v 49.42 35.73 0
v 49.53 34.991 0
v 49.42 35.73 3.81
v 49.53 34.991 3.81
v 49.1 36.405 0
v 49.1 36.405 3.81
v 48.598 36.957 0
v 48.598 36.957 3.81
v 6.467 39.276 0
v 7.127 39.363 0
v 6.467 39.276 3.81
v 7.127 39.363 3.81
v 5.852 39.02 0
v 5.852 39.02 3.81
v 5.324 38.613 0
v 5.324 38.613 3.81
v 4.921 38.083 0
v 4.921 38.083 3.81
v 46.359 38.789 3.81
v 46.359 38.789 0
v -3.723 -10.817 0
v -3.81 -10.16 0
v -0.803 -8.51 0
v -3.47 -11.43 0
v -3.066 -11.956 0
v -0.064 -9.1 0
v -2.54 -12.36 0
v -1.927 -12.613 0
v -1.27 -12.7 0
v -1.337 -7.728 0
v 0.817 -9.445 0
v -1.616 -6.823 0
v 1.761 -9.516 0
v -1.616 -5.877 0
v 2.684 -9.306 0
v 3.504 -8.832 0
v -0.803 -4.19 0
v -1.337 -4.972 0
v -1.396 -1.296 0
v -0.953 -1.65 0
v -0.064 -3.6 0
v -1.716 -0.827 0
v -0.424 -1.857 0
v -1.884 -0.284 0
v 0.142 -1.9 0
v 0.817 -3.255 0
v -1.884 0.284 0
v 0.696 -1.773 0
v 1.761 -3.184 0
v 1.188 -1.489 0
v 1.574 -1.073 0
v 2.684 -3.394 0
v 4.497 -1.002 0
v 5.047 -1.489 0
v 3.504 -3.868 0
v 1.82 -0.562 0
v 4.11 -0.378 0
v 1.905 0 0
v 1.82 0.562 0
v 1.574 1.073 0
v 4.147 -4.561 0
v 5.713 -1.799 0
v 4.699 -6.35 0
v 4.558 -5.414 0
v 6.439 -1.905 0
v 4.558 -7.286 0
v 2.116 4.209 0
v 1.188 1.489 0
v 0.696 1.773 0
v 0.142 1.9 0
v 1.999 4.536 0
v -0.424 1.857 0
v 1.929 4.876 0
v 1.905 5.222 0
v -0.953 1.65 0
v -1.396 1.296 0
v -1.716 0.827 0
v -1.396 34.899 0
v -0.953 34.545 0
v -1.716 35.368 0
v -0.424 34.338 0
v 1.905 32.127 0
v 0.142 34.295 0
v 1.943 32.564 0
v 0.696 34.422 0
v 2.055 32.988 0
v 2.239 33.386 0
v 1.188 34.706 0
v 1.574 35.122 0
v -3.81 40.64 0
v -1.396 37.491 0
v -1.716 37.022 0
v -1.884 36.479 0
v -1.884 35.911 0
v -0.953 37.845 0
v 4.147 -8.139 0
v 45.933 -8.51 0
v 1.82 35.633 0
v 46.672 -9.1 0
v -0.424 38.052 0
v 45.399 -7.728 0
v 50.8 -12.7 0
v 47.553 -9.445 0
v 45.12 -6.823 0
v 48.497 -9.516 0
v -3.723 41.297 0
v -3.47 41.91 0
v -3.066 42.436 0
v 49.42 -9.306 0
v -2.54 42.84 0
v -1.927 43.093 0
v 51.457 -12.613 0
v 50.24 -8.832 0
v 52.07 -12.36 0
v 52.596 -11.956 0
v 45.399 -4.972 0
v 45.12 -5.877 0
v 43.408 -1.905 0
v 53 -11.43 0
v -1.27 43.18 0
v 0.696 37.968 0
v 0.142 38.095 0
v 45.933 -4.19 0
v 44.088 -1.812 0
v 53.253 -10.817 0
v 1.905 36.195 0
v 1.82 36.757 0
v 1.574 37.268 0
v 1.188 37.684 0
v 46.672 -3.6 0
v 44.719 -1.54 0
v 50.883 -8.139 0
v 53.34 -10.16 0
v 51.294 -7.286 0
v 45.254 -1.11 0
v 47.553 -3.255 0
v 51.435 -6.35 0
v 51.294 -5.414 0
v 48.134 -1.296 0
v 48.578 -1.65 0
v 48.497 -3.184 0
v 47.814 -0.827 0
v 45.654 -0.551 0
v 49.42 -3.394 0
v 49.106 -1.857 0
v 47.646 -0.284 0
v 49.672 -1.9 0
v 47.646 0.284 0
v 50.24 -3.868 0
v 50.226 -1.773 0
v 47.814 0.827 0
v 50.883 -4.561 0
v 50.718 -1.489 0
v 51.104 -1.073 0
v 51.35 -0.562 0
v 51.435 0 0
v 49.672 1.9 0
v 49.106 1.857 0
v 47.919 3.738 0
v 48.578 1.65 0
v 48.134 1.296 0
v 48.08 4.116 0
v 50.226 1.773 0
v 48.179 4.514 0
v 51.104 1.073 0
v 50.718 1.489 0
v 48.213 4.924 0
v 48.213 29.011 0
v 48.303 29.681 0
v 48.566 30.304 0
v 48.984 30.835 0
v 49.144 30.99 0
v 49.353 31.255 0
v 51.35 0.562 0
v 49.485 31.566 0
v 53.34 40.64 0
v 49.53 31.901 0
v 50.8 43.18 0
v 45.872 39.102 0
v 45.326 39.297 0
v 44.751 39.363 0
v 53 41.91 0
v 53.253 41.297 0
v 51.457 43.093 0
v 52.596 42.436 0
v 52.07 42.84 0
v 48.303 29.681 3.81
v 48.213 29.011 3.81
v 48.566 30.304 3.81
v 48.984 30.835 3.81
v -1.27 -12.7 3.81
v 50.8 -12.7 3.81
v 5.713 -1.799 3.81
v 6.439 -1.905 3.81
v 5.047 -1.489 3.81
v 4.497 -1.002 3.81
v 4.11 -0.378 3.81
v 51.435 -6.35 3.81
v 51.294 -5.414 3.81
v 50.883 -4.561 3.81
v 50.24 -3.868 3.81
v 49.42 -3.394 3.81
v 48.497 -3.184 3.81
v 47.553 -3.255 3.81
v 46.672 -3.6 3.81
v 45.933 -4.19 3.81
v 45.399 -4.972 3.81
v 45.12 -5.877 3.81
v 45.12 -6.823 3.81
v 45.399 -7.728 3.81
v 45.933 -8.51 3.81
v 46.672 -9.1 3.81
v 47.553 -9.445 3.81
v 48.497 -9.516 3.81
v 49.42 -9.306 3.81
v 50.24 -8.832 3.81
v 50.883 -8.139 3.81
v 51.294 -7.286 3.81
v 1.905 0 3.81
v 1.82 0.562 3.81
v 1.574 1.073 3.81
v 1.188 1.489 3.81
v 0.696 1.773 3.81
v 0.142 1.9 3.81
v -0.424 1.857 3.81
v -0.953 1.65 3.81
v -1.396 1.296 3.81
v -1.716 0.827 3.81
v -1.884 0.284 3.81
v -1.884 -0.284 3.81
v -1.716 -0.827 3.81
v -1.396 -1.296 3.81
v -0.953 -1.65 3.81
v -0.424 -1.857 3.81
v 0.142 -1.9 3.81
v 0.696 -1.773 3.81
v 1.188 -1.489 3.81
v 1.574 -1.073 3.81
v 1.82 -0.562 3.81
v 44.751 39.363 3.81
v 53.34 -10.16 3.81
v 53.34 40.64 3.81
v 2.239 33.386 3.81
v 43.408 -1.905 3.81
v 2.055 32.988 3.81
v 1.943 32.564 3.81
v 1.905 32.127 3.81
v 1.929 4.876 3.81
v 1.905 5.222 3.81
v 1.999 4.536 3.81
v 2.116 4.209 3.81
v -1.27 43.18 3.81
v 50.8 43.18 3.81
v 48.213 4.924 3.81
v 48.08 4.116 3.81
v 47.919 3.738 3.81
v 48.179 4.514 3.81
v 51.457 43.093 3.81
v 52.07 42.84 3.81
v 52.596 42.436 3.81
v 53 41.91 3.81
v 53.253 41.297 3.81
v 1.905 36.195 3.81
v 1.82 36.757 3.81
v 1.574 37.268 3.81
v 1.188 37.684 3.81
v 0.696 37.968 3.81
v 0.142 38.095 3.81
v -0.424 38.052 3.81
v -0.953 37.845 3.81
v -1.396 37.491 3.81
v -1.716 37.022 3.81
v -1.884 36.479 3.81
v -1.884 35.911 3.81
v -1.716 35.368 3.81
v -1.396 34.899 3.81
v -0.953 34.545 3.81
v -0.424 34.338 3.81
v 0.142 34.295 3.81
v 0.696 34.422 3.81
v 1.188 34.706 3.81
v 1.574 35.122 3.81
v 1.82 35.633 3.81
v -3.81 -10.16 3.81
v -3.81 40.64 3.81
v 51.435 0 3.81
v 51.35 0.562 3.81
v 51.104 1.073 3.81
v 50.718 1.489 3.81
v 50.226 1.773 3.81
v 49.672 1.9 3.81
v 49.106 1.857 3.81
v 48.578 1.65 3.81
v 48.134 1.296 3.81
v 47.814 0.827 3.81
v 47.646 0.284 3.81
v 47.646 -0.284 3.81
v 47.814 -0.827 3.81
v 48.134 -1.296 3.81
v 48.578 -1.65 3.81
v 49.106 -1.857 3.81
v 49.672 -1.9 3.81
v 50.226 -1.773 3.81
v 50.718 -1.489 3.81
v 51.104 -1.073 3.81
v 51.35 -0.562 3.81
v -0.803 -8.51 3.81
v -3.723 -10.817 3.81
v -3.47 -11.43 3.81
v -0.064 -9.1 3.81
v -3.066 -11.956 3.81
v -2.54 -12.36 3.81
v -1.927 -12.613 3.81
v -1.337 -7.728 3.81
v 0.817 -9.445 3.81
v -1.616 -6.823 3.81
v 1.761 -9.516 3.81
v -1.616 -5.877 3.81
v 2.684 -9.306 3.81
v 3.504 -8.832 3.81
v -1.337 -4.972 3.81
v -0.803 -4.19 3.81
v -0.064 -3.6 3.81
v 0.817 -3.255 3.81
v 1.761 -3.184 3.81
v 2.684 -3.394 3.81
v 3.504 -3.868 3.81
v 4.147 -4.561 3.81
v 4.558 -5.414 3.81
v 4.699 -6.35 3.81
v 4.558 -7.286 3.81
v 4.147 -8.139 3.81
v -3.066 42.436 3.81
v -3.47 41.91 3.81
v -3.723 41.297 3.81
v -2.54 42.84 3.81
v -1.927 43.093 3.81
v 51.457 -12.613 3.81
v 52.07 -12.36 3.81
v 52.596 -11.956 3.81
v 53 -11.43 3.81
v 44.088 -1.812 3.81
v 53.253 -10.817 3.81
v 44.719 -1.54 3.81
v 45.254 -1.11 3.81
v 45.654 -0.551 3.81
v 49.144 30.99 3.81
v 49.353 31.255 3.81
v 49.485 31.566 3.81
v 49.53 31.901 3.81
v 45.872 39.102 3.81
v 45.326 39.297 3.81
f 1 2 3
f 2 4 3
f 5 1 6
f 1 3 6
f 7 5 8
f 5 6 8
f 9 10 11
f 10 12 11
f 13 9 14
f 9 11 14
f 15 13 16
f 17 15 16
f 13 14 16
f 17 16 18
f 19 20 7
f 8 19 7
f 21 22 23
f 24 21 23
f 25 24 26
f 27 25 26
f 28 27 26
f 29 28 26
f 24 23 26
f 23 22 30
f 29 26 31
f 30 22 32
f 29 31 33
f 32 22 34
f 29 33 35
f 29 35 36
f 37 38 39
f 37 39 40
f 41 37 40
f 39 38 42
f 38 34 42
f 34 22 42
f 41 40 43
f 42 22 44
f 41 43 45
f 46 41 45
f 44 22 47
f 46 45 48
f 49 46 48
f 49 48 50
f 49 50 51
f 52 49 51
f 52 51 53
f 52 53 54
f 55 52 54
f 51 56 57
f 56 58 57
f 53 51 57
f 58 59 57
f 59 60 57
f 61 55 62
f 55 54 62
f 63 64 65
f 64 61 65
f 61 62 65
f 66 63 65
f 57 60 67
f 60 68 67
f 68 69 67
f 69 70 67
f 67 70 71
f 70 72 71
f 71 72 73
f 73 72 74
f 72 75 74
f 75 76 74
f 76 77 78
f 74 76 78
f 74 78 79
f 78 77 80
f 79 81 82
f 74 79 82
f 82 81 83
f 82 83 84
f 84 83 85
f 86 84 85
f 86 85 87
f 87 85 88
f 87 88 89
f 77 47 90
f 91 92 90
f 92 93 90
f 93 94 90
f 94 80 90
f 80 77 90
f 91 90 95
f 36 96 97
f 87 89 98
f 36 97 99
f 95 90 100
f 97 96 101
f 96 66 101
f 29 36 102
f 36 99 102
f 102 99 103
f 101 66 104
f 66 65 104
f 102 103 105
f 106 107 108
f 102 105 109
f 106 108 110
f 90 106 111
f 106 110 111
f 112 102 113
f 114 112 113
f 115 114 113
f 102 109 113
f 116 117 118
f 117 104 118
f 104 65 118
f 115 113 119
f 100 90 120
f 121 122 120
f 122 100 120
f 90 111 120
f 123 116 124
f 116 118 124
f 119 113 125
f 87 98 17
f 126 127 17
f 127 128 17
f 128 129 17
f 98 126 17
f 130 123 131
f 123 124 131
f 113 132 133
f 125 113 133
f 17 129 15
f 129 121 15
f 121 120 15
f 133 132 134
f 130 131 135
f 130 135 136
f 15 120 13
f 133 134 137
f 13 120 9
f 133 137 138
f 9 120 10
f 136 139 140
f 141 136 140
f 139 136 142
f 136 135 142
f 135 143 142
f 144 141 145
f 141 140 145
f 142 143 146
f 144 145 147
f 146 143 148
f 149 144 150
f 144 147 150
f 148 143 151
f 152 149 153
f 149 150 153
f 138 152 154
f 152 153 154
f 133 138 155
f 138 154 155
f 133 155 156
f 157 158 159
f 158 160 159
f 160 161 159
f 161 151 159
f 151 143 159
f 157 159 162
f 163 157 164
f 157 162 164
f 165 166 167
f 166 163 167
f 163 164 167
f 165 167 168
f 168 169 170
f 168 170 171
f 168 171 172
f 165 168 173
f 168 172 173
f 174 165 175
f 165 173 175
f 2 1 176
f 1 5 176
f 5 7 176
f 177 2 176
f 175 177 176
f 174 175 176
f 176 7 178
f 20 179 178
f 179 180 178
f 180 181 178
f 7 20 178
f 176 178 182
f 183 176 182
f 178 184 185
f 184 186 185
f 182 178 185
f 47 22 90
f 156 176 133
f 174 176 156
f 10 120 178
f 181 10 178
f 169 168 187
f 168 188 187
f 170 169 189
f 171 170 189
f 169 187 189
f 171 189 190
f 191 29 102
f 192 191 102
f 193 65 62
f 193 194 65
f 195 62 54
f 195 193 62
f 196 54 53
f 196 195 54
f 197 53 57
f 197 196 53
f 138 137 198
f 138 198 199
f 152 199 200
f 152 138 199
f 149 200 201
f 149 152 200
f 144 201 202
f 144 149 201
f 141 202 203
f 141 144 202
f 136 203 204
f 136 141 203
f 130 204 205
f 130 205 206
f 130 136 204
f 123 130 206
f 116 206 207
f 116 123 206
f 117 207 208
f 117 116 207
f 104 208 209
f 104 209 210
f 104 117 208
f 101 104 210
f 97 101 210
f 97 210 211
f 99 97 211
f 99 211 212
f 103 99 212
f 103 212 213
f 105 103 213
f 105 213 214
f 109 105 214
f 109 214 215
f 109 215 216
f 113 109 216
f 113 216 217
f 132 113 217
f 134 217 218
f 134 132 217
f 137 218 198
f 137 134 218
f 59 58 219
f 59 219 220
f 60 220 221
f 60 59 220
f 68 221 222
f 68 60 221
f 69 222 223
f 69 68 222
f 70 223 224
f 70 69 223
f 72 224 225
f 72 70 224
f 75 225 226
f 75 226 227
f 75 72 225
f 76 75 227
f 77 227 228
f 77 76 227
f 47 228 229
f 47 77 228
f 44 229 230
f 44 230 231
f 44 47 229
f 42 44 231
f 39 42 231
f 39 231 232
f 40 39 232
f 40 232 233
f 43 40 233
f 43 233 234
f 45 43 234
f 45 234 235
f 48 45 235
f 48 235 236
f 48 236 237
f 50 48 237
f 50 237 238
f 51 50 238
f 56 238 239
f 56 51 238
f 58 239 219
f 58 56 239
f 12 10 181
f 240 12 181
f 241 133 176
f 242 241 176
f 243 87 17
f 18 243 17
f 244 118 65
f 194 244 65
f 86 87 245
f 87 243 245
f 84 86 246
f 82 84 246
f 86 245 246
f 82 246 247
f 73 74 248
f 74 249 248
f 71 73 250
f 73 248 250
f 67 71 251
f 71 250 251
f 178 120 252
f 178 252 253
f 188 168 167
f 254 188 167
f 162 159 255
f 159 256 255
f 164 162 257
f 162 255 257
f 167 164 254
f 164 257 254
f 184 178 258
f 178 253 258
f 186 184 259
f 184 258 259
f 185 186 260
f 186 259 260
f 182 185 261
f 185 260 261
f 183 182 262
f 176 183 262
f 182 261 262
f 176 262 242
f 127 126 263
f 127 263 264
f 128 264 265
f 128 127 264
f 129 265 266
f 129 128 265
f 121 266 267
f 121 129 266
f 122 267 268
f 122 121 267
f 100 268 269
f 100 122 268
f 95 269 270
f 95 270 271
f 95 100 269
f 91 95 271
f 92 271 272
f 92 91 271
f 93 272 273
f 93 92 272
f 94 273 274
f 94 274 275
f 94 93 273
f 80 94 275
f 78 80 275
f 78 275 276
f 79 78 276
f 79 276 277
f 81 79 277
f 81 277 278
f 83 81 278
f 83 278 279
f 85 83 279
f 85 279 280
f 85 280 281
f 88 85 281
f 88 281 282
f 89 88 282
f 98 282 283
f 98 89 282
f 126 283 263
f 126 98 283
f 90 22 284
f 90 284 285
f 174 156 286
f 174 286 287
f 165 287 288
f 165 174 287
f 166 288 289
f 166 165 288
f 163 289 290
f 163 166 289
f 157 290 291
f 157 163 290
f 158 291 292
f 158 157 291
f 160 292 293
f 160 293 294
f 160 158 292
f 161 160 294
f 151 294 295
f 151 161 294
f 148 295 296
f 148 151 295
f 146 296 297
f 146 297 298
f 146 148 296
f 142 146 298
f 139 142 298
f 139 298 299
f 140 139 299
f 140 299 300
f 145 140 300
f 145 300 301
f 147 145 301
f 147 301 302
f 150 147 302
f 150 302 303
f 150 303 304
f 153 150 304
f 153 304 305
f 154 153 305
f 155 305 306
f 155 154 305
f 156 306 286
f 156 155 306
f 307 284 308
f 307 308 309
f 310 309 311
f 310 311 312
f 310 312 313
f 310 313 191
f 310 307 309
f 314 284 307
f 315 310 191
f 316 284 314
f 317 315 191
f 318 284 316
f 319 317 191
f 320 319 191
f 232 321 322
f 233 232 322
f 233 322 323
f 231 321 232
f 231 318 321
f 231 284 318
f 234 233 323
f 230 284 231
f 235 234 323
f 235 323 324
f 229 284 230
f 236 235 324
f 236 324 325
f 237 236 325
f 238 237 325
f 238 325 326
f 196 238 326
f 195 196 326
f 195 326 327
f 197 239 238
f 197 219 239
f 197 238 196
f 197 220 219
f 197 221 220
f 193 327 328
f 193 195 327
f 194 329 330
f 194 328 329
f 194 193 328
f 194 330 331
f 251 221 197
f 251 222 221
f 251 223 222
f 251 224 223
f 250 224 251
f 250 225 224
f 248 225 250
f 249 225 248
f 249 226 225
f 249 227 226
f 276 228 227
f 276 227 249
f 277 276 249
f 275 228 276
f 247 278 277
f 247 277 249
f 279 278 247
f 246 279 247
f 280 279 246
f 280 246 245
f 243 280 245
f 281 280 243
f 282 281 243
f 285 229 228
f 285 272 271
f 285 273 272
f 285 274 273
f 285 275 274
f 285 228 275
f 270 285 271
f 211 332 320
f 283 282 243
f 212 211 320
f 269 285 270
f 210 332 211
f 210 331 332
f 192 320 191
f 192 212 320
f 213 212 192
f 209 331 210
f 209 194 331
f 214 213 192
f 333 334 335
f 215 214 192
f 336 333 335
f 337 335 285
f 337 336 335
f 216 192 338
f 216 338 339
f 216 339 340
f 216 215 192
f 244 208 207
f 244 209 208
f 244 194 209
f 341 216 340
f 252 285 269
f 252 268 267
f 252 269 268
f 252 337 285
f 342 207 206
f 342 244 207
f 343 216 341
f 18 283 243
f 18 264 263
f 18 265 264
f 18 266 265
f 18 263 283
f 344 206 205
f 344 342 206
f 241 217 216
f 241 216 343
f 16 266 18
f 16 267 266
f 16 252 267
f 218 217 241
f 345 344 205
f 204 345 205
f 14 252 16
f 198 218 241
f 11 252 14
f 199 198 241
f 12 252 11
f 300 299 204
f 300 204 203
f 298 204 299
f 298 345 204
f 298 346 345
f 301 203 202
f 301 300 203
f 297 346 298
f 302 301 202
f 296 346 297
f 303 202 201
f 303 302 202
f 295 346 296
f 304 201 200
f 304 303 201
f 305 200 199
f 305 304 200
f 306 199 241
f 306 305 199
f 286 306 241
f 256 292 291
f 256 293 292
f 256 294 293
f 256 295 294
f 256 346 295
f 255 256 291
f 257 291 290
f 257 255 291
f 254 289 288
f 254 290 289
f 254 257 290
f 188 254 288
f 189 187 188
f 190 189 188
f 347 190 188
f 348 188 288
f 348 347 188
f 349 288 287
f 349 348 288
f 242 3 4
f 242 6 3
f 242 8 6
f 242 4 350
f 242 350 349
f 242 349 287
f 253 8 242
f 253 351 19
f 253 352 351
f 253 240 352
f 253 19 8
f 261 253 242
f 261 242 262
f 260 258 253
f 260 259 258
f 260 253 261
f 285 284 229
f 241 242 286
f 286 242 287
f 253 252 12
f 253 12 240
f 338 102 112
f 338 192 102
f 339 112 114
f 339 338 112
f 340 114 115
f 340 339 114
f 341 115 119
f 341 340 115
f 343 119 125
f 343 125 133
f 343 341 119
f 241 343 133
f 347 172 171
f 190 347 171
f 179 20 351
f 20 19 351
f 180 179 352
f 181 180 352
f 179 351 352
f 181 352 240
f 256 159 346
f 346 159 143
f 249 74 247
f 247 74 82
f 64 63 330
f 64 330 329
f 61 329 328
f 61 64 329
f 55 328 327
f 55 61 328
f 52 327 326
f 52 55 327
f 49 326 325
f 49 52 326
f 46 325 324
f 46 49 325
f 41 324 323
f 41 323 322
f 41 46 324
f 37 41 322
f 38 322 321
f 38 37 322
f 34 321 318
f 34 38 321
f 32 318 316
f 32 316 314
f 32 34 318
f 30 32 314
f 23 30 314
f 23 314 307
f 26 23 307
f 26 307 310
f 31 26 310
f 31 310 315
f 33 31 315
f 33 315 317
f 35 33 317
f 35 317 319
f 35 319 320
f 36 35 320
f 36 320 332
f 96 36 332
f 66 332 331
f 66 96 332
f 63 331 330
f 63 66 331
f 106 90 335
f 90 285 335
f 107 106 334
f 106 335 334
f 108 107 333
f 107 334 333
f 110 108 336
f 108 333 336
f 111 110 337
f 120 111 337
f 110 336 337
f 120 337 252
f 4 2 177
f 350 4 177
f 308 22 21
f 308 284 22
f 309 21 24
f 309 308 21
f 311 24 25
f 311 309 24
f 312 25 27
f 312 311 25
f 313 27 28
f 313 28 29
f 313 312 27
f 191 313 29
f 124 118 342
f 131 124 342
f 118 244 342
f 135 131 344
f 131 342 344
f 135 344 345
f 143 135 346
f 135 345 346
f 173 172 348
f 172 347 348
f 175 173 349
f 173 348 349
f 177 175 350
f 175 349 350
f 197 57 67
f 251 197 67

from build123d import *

# Parameters (mm, degrees)
F0_W     = 57.15
F0_H     = 55.88
F0_R     = 3.175
F0_R_2   = 1.905
F1_DEPTH = 3.81
F2_R     = 2.54
F3_R     = 1.27


with BuildPart() as f1:
    # F0 (on Top) → F1 (new body)
    with BuildSketch(Plane.XY):
        with Locations((24.765, 15.24)):
            Rectangle(F0_W, F0_H)
        with Locations((1.524, -6.35)):
            Circle(F0_R, mode=Mode.SUBTRACT)
        Circle(F0_R_2, mode=Mode.SUBTRACT)
        with Locations((48.26, -6.35)):
            Circle(F0_R, mode=Mode.SUBTRACT)
        with Locations((49.53, 0)):
            Circle(F0_R_2, mode=Mode.SUBTRACT)
        with Locations((0, 36.195)):
            Circle(F0_R_2, mode=Mode.SUBTRACT)
        Polygon((4.773997, -1.905), (1.905, 4.693742), (1.905, 32.801047), (5.652351, 39.363042), (45.657352, 39.363042), (49.53, 36.195), (49.53, 31.363741), (48.212558, 30.086137), (48.212558, 4.29449), (44.938698, -1.905), align=None, mode=Mode.SUBTRACT)
    extrude(amount=F1_DEPTH)

    # F2
    f2_edges = [f1.edges().sort_by_distance(p)[0] for p in [
        (-3.81, -12.7, 1.905),
        (-3.81, 43.18, 1.905),
        (53.34, -12.7, 1.905),
        (53.34, 43.18, 1.905),
        (1.905, 32.801047, 1.905),
        (5.652351, 39.363042, 1.905),
        (1.905, 4.693742, 1.905),
        (4.773997, -1.905, 1.905),
        (45.657352, 39.363042, 1.905),
        (49.53, 36.195, 1.905),
        (48.212558, 30.086137, 1.905),
        (48.212558, 4.29449, 1.905),
        (44.938698, -1.905, 1.905),
    ]]
    fillet(f2_edges, radius=F2_R)

    # F3
    f3_edges = [f1.edges().sort_by_distance(p)[0] for p in [
        (49.53, 31.363741, 1.905),
    ]]
    fillet(f3_edges, radius=F3_R)


solid = f1.part
